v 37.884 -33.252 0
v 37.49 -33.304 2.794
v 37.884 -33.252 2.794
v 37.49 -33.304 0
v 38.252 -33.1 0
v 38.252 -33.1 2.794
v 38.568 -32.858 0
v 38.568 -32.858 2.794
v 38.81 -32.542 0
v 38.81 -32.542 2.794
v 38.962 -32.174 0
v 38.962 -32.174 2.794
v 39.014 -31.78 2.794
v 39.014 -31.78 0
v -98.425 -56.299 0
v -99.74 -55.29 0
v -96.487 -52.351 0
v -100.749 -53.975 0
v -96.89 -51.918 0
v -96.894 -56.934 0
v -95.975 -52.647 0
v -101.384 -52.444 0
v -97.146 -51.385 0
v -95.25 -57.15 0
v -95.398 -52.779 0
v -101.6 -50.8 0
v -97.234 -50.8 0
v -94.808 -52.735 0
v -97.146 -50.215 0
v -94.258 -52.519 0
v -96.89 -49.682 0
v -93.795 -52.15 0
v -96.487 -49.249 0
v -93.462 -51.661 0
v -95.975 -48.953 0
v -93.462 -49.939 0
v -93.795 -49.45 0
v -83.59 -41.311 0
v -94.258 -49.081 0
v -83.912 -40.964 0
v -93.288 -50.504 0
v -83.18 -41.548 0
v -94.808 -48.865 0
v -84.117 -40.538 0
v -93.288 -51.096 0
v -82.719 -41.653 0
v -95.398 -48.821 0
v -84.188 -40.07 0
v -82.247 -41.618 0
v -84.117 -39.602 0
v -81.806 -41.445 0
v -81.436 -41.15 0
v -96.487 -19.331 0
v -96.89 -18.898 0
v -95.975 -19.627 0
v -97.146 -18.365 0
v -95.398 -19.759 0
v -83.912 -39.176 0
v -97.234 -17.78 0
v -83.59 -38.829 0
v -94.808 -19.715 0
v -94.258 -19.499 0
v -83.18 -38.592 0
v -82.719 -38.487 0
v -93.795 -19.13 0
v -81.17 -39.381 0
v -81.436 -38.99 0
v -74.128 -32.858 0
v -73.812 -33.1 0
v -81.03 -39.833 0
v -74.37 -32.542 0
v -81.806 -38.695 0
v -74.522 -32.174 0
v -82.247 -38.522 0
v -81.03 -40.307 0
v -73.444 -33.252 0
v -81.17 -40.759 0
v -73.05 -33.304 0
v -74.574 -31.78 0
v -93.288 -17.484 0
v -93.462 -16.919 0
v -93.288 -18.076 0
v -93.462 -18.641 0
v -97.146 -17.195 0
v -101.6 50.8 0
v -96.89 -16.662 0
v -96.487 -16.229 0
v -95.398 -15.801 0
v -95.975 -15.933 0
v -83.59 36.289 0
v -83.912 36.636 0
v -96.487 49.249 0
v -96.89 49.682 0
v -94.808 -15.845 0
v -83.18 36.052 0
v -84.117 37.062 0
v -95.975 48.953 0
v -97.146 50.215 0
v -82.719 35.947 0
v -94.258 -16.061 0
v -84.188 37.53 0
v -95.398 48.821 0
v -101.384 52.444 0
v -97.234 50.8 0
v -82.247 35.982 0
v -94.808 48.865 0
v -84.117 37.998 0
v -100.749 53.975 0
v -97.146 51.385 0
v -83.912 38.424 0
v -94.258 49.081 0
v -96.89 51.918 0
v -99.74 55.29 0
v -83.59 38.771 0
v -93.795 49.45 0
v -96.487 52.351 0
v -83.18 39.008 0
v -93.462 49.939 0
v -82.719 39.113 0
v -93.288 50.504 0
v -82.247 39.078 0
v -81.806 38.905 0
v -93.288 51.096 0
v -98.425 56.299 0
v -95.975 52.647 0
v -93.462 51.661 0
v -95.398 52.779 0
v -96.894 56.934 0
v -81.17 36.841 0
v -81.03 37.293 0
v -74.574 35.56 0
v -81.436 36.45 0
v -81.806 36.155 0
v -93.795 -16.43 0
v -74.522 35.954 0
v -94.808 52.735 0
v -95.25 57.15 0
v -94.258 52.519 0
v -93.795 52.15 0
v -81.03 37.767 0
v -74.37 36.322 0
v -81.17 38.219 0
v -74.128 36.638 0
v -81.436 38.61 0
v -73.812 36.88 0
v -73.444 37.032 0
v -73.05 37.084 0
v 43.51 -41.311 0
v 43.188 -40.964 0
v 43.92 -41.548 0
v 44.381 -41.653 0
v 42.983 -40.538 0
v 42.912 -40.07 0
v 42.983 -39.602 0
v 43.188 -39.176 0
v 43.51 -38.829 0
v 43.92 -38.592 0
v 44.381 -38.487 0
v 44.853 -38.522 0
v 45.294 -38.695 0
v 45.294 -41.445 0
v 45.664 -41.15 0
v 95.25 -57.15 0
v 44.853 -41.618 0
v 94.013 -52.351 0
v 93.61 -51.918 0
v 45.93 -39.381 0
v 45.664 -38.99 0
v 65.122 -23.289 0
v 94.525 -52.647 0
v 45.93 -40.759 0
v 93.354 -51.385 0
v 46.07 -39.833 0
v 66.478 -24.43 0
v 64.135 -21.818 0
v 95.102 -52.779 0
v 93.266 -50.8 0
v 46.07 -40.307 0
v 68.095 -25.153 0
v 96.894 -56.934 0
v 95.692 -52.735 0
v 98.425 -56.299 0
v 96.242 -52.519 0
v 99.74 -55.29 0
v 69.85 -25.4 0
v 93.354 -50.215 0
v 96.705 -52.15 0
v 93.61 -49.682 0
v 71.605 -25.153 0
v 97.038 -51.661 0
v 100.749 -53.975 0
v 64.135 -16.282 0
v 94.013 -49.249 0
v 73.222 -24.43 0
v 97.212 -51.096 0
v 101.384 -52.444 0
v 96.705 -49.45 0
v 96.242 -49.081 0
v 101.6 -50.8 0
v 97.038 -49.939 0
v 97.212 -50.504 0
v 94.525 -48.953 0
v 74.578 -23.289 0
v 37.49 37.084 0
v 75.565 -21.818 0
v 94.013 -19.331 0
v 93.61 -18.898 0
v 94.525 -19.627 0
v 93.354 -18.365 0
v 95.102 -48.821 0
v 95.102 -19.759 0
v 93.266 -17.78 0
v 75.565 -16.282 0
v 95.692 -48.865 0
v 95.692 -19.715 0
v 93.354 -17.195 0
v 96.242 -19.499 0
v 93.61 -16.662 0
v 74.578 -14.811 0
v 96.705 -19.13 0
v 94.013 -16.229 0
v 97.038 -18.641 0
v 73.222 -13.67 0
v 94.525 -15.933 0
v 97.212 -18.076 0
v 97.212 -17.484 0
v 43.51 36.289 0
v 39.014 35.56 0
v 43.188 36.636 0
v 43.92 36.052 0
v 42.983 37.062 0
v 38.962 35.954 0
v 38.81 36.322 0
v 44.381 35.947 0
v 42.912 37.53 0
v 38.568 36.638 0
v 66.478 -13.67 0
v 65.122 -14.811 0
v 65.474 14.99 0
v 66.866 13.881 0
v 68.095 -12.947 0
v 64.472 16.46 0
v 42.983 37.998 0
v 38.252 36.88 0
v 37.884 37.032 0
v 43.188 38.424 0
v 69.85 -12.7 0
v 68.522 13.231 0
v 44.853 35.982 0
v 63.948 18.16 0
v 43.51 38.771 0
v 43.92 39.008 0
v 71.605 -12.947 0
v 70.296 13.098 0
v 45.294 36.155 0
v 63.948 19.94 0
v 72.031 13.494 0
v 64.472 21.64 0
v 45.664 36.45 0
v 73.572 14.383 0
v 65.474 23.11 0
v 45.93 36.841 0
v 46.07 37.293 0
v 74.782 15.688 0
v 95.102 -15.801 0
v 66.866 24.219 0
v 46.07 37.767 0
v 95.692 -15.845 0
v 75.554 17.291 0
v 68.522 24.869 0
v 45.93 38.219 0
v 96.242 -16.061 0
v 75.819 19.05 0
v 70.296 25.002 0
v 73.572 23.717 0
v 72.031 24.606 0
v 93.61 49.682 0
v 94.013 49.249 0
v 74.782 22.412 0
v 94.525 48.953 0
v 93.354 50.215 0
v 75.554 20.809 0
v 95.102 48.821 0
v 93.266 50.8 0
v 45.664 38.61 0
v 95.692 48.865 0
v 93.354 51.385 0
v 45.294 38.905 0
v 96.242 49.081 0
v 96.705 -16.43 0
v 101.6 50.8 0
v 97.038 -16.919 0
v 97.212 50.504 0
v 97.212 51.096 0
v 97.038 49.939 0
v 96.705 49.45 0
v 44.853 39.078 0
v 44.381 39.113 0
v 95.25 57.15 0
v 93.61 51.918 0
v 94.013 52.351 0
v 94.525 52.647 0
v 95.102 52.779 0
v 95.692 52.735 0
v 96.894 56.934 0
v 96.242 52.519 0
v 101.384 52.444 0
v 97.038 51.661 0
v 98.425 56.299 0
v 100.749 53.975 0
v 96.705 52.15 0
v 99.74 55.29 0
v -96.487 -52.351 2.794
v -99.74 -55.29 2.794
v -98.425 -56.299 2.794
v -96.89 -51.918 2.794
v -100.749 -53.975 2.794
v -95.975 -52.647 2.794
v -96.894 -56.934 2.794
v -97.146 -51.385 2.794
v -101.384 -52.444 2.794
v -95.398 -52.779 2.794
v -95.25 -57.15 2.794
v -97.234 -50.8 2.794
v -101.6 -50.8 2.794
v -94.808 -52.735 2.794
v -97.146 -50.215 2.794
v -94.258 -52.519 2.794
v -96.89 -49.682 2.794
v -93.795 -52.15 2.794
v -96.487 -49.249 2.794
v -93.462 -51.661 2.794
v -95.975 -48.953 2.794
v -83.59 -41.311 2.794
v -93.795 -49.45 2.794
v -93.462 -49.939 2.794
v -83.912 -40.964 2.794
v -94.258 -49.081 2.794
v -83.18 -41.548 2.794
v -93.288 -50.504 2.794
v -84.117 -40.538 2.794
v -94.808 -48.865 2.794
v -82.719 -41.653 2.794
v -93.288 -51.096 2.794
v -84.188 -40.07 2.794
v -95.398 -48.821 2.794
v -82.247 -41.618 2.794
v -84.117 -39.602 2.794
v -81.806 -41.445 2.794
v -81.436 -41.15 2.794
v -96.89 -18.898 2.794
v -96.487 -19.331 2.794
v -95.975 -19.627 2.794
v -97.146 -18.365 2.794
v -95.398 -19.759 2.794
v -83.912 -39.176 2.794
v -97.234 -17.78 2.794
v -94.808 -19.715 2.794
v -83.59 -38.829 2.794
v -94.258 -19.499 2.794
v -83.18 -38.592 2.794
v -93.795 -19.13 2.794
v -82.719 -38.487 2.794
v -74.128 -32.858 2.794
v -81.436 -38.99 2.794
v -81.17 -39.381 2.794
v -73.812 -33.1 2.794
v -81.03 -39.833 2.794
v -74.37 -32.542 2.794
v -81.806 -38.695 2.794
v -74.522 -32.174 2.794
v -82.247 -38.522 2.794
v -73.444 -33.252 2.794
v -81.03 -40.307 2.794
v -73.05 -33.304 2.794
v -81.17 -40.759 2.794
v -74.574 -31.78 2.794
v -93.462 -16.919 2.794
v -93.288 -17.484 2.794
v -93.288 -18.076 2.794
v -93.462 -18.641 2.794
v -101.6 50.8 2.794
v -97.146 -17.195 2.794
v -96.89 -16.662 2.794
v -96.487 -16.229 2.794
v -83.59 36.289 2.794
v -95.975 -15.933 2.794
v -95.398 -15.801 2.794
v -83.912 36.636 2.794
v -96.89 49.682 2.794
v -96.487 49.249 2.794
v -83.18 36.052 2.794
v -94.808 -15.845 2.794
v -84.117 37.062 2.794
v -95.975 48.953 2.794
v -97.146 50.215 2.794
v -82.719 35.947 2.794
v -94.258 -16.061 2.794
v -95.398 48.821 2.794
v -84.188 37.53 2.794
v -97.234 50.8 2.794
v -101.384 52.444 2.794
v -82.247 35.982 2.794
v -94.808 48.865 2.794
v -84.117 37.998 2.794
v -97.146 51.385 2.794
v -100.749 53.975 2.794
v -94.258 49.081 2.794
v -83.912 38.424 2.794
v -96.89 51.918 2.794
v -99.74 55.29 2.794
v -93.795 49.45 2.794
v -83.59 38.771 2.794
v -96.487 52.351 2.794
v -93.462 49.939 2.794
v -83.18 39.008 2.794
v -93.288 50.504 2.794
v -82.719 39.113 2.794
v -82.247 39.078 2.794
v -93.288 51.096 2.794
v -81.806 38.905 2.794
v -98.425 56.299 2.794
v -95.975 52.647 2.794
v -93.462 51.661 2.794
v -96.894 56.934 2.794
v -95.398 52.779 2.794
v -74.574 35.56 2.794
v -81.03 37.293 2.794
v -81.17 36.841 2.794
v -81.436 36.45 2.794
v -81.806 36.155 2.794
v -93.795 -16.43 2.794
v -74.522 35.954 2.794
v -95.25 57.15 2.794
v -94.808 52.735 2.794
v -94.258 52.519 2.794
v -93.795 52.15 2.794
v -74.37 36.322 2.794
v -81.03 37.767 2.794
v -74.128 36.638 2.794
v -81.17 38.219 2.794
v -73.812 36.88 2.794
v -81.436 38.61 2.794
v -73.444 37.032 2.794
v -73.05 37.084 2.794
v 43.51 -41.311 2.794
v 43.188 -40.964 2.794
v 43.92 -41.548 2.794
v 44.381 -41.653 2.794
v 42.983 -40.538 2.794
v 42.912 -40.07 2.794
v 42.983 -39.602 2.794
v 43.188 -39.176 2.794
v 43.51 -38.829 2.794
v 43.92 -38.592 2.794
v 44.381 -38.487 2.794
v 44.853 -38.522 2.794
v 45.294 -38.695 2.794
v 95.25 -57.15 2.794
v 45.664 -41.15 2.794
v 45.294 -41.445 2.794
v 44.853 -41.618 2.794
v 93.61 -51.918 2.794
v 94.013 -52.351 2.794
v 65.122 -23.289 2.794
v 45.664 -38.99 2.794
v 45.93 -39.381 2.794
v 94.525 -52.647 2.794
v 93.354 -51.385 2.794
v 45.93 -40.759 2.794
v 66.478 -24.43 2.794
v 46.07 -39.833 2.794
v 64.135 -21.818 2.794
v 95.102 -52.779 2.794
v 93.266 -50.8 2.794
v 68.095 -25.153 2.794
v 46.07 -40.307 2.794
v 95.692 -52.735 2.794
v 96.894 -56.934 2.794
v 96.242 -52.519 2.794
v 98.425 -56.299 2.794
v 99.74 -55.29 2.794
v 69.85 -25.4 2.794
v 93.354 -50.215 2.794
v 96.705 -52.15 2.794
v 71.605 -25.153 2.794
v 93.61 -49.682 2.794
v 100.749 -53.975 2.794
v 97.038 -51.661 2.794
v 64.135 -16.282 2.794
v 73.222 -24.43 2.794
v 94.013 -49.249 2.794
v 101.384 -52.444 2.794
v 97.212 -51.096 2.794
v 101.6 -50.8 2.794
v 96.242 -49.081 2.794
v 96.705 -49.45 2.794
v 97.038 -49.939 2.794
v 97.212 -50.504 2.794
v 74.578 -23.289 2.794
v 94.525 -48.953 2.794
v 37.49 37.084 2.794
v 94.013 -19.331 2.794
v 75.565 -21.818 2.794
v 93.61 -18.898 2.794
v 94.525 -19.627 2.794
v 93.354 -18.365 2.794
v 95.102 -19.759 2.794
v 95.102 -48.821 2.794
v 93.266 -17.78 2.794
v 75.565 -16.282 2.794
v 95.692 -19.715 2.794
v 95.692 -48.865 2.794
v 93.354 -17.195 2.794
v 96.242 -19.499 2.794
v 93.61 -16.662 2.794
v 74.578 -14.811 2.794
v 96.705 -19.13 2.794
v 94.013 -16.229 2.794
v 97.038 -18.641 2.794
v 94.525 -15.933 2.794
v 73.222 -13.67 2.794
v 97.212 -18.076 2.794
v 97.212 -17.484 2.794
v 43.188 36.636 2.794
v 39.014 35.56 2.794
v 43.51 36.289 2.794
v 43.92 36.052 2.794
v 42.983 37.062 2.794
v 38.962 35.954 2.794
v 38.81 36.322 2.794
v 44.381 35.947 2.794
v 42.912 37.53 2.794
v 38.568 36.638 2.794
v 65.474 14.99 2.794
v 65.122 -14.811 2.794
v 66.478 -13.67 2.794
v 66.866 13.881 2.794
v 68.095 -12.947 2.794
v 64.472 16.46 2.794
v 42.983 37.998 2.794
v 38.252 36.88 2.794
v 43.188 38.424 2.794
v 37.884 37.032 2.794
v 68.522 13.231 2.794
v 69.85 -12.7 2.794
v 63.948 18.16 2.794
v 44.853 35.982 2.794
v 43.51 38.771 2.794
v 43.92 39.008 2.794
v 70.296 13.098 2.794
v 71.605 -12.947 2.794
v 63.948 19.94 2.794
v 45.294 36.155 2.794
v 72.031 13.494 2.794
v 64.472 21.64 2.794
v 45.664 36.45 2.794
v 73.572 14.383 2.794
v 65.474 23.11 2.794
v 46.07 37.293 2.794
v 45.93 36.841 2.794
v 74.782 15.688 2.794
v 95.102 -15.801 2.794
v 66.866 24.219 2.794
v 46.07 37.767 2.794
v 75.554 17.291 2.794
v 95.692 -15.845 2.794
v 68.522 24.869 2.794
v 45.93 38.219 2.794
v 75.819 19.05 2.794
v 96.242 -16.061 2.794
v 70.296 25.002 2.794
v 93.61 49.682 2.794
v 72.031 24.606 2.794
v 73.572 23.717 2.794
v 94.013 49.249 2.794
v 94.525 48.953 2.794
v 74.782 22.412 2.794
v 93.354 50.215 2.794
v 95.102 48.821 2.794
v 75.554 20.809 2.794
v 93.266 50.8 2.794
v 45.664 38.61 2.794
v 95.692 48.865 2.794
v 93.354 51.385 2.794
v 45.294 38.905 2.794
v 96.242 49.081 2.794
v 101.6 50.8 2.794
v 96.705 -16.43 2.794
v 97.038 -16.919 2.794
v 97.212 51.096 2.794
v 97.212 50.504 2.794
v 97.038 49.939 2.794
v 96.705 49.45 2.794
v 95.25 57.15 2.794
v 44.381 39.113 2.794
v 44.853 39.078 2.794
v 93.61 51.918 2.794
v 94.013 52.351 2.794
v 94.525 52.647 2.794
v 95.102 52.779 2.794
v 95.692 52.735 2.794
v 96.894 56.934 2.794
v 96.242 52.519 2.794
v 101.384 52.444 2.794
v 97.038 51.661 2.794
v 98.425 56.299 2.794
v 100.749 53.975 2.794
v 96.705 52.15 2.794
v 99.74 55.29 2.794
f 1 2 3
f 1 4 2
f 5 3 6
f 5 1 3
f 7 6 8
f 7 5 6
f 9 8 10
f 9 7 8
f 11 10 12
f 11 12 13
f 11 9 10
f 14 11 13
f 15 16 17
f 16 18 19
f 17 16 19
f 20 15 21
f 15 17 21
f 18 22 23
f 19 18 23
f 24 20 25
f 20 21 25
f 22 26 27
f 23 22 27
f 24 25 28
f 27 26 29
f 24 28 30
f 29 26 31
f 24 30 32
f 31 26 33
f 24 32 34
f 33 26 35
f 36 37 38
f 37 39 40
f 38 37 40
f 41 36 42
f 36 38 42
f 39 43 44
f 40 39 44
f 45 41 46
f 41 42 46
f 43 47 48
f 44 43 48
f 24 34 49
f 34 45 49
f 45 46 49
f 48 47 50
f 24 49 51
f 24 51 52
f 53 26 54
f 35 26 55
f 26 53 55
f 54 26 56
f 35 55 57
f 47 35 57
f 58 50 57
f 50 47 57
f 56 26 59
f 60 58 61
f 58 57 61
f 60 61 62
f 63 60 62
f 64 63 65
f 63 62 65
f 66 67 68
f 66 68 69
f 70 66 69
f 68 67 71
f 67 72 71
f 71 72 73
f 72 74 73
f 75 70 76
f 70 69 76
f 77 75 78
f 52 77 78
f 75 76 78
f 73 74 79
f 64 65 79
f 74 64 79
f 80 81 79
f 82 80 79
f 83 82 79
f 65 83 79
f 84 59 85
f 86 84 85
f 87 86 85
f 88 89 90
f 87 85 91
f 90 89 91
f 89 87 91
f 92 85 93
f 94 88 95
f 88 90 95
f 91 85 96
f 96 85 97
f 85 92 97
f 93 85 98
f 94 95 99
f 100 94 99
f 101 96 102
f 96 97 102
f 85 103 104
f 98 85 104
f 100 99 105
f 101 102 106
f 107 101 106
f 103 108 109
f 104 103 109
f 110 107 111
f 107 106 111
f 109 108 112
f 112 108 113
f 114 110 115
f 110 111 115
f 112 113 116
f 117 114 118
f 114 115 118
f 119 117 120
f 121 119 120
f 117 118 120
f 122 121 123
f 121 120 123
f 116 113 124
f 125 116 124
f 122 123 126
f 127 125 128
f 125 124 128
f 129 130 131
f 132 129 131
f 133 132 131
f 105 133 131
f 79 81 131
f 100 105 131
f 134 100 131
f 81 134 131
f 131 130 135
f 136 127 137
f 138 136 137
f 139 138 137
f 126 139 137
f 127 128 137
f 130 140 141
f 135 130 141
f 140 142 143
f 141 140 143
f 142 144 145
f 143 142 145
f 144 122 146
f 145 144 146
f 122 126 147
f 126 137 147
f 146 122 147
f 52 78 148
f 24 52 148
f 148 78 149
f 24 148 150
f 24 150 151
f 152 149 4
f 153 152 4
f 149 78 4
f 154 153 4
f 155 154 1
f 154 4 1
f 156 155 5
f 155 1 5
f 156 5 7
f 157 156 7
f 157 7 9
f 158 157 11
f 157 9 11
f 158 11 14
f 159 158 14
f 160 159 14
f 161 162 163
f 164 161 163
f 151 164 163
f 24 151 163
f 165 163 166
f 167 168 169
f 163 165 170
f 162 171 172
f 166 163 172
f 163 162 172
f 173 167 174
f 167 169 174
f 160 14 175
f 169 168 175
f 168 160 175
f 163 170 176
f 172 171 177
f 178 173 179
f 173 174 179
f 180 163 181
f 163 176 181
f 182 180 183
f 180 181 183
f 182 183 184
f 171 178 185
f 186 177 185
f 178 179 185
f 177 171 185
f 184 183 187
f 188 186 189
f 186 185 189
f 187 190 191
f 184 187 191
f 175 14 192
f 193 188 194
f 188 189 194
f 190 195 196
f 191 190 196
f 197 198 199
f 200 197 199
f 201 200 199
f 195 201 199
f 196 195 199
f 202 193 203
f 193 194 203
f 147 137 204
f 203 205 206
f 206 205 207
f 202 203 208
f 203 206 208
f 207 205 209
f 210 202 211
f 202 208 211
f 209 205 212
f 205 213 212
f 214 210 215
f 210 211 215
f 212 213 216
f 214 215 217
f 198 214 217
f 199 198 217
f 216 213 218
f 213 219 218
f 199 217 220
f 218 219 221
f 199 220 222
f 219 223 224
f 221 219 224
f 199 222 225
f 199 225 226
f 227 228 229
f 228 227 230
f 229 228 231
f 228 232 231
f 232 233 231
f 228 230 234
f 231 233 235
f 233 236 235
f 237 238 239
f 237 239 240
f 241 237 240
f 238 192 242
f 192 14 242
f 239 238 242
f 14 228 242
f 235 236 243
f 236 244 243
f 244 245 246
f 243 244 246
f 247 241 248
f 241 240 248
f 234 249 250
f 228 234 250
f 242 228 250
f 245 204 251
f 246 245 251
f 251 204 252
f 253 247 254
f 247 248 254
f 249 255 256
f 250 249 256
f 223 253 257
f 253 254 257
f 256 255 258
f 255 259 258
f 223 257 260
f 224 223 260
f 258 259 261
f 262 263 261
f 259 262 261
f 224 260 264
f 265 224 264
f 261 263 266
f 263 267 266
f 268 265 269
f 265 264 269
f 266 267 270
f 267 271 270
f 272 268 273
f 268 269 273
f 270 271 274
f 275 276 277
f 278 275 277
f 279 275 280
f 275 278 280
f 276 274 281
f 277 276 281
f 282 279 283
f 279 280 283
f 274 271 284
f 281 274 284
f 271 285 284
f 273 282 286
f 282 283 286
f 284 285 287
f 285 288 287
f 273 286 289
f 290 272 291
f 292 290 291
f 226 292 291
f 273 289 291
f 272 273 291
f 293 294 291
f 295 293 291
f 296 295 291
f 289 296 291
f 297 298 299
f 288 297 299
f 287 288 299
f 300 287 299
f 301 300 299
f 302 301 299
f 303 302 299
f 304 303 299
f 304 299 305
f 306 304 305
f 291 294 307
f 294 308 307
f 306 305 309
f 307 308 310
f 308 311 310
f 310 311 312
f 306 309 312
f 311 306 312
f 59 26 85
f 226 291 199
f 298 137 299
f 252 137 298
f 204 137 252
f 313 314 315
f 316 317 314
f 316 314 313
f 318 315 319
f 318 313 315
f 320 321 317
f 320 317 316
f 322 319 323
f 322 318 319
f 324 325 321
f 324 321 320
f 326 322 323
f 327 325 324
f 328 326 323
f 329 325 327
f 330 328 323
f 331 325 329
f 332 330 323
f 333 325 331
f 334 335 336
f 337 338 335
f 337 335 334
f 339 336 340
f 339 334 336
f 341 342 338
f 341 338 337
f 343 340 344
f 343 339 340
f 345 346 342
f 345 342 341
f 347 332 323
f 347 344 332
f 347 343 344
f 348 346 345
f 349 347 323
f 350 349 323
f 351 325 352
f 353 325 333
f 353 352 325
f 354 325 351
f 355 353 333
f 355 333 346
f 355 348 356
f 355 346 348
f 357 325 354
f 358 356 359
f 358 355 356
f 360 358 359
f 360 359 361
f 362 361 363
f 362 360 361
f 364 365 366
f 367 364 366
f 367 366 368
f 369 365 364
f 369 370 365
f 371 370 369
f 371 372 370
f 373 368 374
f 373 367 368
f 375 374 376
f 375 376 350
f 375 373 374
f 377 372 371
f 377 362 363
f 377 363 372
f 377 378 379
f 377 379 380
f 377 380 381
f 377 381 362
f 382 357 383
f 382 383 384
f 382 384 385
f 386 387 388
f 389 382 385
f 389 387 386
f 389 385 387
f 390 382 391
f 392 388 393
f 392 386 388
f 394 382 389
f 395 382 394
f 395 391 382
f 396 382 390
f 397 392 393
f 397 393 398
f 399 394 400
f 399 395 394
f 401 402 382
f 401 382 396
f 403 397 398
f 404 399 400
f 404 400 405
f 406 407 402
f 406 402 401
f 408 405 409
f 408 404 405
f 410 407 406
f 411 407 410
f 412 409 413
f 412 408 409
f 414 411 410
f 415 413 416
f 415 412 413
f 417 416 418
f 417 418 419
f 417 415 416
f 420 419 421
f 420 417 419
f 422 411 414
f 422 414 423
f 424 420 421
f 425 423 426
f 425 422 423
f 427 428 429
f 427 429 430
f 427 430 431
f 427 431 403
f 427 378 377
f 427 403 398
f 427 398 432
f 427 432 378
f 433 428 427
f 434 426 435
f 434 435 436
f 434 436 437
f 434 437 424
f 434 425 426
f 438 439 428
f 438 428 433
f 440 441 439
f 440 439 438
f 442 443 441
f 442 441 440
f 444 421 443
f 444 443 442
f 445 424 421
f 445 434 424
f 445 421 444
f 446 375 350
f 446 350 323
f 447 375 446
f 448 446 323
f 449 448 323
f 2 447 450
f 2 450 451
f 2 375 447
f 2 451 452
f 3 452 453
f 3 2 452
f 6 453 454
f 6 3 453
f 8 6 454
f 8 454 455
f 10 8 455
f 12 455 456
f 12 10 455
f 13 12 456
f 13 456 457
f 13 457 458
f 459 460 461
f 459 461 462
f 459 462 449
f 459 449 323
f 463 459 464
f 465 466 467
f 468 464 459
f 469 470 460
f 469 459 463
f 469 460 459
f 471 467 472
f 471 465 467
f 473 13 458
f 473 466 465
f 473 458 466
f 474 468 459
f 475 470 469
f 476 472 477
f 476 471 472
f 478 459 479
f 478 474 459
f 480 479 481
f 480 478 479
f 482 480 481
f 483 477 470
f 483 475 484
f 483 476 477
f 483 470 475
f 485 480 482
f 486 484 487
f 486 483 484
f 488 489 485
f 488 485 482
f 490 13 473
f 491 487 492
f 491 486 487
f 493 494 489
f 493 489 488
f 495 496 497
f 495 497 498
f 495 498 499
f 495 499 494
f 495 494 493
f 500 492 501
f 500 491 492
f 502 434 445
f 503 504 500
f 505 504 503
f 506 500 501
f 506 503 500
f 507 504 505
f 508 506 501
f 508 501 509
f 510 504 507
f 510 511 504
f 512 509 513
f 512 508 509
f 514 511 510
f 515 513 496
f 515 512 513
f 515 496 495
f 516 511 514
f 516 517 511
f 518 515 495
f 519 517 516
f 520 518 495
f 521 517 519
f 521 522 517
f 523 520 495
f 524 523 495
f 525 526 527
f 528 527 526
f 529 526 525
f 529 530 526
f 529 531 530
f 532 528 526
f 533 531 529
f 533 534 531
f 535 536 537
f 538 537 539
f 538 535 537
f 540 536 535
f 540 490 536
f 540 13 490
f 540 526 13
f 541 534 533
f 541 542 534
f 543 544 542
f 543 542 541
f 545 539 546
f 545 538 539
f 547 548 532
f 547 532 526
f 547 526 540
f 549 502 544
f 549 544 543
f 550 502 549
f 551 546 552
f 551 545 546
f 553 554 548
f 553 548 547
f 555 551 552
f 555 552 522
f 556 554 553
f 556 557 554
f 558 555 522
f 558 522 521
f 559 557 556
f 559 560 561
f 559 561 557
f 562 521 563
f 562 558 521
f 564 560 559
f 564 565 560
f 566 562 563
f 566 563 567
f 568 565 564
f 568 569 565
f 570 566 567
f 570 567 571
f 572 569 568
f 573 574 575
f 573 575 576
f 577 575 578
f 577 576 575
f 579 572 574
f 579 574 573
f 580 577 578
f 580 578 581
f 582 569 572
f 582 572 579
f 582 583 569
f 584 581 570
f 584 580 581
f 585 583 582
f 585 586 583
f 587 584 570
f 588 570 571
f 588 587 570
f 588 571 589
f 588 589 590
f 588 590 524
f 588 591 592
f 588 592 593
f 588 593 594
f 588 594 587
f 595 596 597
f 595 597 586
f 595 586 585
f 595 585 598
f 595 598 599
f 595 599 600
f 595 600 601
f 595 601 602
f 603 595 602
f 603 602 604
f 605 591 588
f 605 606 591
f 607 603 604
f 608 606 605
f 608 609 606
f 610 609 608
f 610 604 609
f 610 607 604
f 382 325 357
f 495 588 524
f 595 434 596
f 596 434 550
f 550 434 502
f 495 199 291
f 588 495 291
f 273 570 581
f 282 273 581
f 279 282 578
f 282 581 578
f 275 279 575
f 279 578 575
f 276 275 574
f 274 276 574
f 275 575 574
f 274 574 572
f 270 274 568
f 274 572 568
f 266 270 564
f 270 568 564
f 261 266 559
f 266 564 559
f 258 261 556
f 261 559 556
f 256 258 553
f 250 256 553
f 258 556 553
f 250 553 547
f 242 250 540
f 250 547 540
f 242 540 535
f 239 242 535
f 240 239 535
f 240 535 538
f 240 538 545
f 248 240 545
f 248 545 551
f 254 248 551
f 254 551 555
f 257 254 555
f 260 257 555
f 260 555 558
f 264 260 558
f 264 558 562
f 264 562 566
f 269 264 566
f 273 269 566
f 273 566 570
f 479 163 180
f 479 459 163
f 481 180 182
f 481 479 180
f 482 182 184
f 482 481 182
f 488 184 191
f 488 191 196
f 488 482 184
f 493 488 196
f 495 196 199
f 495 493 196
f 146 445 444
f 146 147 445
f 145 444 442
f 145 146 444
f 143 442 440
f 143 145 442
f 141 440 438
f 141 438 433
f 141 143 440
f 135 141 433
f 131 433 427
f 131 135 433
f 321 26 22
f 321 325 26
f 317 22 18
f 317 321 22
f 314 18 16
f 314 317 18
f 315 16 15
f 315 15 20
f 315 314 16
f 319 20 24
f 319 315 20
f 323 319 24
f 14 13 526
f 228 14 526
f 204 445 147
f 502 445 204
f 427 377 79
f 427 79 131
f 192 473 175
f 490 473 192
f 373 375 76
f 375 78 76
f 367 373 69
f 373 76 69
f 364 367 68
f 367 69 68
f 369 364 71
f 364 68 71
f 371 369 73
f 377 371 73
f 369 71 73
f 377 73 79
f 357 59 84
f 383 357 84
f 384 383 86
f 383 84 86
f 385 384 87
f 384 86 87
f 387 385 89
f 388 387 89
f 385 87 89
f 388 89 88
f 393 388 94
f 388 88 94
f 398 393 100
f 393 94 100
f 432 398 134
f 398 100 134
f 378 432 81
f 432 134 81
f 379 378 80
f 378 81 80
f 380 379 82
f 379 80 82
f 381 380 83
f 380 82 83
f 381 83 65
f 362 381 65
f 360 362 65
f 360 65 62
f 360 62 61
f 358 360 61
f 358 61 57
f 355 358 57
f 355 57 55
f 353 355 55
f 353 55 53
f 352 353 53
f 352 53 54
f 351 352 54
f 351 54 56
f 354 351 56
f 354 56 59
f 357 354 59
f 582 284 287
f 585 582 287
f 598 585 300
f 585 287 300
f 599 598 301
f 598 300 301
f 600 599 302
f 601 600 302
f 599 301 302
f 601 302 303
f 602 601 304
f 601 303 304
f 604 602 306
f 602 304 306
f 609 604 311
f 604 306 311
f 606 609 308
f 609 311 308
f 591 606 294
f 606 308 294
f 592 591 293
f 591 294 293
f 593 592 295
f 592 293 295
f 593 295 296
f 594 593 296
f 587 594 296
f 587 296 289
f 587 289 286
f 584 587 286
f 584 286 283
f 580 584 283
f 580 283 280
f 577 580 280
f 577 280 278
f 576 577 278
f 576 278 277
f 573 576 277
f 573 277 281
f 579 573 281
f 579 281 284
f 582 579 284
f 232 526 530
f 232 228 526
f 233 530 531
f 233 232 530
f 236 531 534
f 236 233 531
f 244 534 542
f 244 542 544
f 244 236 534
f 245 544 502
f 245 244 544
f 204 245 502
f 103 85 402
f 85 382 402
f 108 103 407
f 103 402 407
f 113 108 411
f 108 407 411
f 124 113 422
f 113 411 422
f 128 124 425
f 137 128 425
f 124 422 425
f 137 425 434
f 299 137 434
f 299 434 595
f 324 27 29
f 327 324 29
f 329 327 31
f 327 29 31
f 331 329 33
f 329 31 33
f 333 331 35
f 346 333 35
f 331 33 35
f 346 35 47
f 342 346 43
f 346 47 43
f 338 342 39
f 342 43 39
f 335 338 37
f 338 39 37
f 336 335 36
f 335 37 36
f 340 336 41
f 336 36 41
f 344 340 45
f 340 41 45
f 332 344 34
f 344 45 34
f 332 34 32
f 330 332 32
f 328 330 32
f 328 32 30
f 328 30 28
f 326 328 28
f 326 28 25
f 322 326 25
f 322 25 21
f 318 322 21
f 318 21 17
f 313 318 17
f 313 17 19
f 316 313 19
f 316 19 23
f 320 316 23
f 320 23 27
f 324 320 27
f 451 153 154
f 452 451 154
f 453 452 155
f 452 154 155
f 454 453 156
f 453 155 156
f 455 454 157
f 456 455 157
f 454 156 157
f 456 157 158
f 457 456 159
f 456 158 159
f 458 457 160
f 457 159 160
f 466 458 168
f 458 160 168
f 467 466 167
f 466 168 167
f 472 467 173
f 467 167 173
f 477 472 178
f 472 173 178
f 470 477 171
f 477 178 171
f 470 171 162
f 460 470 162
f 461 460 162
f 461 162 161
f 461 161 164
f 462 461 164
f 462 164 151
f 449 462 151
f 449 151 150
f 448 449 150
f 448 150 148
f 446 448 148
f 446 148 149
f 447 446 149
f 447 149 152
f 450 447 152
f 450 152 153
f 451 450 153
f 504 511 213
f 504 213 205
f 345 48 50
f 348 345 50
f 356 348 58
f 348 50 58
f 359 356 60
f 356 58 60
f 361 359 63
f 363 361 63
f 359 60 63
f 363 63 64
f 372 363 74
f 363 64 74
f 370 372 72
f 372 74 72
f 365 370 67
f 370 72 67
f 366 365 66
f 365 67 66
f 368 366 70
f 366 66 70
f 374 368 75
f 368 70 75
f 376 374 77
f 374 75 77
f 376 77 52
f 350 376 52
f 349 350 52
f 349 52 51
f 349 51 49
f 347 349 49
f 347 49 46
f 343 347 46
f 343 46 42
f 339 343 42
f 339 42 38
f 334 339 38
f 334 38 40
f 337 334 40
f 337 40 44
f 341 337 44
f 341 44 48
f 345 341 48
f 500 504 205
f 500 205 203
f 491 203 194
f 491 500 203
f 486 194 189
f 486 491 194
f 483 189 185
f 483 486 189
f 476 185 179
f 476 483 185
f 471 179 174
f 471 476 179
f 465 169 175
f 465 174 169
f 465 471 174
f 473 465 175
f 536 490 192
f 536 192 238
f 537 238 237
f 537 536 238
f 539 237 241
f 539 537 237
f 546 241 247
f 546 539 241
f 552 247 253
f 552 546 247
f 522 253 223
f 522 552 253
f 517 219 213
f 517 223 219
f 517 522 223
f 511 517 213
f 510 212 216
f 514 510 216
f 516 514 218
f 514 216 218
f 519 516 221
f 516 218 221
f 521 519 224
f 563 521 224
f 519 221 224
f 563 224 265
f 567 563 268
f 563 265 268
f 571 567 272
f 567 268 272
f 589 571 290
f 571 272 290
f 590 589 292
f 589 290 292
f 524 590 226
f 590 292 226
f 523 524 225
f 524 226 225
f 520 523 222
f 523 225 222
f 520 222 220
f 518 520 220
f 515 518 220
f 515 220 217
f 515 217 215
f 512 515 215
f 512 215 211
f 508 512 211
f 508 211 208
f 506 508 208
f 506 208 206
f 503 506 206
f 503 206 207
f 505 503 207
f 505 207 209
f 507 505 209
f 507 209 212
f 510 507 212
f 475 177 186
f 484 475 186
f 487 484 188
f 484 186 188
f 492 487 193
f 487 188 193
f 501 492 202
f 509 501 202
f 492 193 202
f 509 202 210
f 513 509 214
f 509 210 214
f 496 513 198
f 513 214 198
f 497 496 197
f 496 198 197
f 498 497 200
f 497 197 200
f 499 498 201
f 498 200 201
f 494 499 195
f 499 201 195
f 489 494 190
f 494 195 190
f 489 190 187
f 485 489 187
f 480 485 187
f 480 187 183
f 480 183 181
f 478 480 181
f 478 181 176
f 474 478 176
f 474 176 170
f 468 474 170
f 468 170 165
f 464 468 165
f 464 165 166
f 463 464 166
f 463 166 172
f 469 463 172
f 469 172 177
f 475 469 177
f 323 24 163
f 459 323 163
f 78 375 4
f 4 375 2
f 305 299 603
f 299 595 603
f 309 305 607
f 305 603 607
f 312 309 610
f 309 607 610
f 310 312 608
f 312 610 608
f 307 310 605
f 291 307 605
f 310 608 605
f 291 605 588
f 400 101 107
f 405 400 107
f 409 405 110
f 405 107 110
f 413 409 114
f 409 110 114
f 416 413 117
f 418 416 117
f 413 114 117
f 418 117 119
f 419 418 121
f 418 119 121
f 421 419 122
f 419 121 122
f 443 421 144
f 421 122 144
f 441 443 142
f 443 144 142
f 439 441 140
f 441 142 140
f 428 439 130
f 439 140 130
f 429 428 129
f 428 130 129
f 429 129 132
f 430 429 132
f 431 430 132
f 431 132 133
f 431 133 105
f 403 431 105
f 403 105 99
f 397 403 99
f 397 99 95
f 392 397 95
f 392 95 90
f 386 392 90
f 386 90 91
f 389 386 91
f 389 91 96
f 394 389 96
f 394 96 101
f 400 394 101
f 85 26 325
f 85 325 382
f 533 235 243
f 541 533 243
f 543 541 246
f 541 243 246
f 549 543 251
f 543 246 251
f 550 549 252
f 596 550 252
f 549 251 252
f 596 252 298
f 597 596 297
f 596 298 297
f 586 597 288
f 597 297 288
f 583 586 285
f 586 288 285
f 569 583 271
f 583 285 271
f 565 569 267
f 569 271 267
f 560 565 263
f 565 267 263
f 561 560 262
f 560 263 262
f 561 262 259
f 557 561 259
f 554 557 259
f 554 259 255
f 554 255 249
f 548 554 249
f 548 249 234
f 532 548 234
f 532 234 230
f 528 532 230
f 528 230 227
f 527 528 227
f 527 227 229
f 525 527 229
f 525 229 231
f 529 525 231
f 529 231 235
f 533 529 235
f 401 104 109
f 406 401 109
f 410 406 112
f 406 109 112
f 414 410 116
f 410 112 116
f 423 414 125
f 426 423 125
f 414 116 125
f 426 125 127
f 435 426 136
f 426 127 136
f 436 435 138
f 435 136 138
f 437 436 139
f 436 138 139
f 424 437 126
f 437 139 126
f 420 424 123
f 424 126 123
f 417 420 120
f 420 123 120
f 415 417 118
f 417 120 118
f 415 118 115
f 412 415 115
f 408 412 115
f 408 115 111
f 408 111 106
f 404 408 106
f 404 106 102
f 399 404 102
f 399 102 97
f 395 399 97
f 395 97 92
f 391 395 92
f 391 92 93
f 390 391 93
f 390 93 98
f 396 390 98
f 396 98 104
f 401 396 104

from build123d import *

# Parameters (mm, degrees)
SKETCH1_W                       = 203.2
SKETCH1_H                       = 114.3
BOSS_EXTRUDE1_DEPTH             = 2.794
F_1_8_0_125_DIAMETER_HOLE1_D    = 3.175
F_5_32_0_15625_DIAMETER_HOLE1_D = 3.96875
SKETCH4_W                       = 113.5879999
SKETCH4_H                       = 70.38799994
CUT_EXTRUDE1_DEPTH              = 117.603983362
FILLET1_R                       = 1.524
FILLET2_R                       = 6.35
SKETCH7_R                       = 5.969
CUT_EXTRUDE2_DEPTH              = 117.603983362


with BuildPart() as part:
    # Sketch1 → Boss-Extrude1 (new body)
    with BuildSketch(Plane.XY):
        Rectangle(SKETCH1_W, SKETCH1_H)
    extrude(amount=BOSS_EXTRUDE1_DEPTH)

    # 1/8 (0.125) Diameter Hole1 (through all)
    with Locations(Plane.XY.offset(2.794)):
        with Locations((-82.6, -40.07), (-82.6, 37.53), (44.5, -40.07), (44.5, 37.53)):
            Hole(F_1_8_0_125_DIAMETER_HOLE1_D / 2)

    # 5/32 (0.15625) Diameter Hole1 (through all)
    with Locations(Plane.XY.offset(2.794)):
        with Locations((95.25, -17.78), (-95.25, 50.8), (95.25, 50.8), (95.25, -50.8), (-95.25, -50.8), (-95.25, -17.78)):
            Hole(F_5_32_0_15625_DIAMETER_HOLE1_D / 2)

    # Sketch4 → Cut-Extrude1 (cut, through all)
    with BuildSketch(Plane.XY.offset(2.794)):
        with Locations((-17.78, 1.89000003)):
            Rectangle(SKETCH4_W, SKETCH4_H)
    extrude(amount=-CUT_EXTRUDE1_DEPTH, mode=Mode.SUBTRACT)

    # Fillet1
    fillet1_edges = [part.edges().sort_by_distance(p)[0] for p in [
        (39.01399995, 37.084, 1.397),
        (39.01399995, -33.30399994, 1.397),
        (-74.57399995, -33.30399994, 1.397),
        (-74.57399995, 37.084, 1.397),
    ]]
    fillet(fillet1_edges, radius=FILLET1_R)

    # Fillet2
    fillet2_edges = [part.edges().sort_by_distance(p)[0] for p in [
        (101.6, -57.15, 1.397),
        (-101.6, -57.15, 1.397),
        (-101.6, 57.15, 1.397),
        (101.6, 57.15, 1.397),
    ]]
    fillet(fillet2_edges, radius=FILLET2_R)

    # Sketch7 → Cut-Extrude2 (cut, through all)
    with BuildSketch(Plane.XY.offset(2.794)):
        with Locations((69.85, 19.05)):
            Circle(SKETCH7_R)
        with BuildLine():
            Line((64.135, -21.817900829), (64.135, -16.282099171))
            ThreePointArc((64.135, -16.282099171), (69.85, -12.7), (75.565, -16.282099171))
            Line((75.565, -16.282099171), (75.565, -21.817900829))
            ThreePointArc((75.565, -21.817900829), (69.85, -25.4), (64.135, -21.817900829))
        make_face()
    extrude(amount=-CUT_EXTRUDE2_DEPTH, mode=Mode.SUBTRACT)


solid = part.part
